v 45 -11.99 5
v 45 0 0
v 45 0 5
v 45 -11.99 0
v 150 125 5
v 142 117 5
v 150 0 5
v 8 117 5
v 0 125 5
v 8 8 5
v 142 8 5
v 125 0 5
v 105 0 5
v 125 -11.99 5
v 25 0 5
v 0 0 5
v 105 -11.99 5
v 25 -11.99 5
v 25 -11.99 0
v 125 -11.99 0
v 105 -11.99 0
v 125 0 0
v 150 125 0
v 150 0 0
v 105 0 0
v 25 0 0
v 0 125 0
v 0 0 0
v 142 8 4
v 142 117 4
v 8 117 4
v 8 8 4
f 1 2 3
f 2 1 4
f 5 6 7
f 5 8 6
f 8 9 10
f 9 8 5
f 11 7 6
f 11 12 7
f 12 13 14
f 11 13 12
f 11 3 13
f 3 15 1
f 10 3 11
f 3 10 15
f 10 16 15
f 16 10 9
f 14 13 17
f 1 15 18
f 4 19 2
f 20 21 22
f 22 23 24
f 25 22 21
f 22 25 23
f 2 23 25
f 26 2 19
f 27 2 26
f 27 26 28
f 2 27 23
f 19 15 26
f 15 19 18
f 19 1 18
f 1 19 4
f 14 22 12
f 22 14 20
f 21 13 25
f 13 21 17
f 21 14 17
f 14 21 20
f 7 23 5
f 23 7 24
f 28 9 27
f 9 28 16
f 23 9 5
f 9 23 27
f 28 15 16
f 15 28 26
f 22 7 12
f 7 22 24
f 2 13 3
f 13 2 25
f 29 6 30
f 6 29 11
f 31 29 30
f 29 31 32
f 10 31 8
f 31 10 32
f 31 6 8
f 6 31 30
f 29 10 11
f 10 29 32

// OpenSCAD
// file: ../lib/dovetail.scad
// lib/dovetail.scad
// Shared joinery modules: dovetail tenon/mortise, M3 insert boss, rounded box.
// Depends on values in params.scad (include it in the calling file).

// A dovetail tenon: a flared prism that grows wider toward its tip so it locks
// against a matching mortise when slid in along +y.
//   len   : protrusion length (along +y)
//   base_w: width at the root (x, near the part)
//   tip_w : width at the tip (x, wider -> self locking)
//   h     : height (z)
// Literal defaults keep this library self-contained under `use <>` (which does
// not import the caller's params). Callers pass explicit sizes where needed.
module dovetail_tenon(len = 8, base_w = 8, tip_w = 12, h = 10) {
    linear_extrude(height = h)
        polygon(points = [
            [-base_w/2, 0],
            [ base_w/2, 0],
            [ tip_w/2,  len],
            [-tip_w/2,  len],
        ]);
}

// Matching mortise volume (subtract this). Enlarged by tol_dovetail per side.
module dovetail_mortise(len = 8, base_w = 8, tip_w = 12, h = 10, clr = 0.15) {
    // extend slightly beyond both faces so the cut is clean
    translate([0, -0.01, -0.01])
        linear_extrude(height = h + 0.02)
            polygon(points = [
                [-(base_w/2 + clr), 0],
                [ (base_w/2 + clr), 0],
                [ (tip_w/2 + clr),  len + 0.02],
                [-(tip_w/2 + clr),  len + 0.02],
            ]);
}

// Cylindrical boss with a blind hole for a heat-set insert.
//   boss_d : outer diameter of the boss
//   boss_h : height
//   hole_d : insert press-hole diameter (params: m3_insert)
//   hole_depth : blind hole depth (0 = through)
module insert_boss(boss_d = 8, boss_h = 8, hole_d = 4.0, hole_depth = 0) {
    difference() {
        cylinder(d = boss_d, h = boss_h);
        translate([0, 0, hole_depth == 0 ? -0.01 : boss_h - hole_depth])
            cylinder(d = hole_d, h = hole_depth == 0 ? boss_h + 0.02 : hole_depth + 0.01);
    }
}

// Rounded rectangular box shell (open top) used by gondola / recesses.
module rounded_box(x, y, z, r = 2) {
    hull() {
        for (sx = [-1, 1], sy = [-1, 1])
            translate([sx * (x/2 - r), sy * (y/2 - r), 0])
                cylinder(r = r, h = z);
    }
}

// A simple rectangular slot cutter (for tabs), centered on x, open along z.
module slot(w, t, d) {
    translate([-w/2, -t/2, -0.01])
        cube([w, t, d + 0.02]);
}
// main file
// booth/wall_panel.scad
// Wall panel 150 x 125 x 5, shared base + three variants.
//   variant = "blackboard" : framed shallow recess (green paper backing)
//   variant = "window"     : 2x2 window openings + back rebate for sky paper
//   variant = "board"      : cork-style frame + pin-hole grid (bulletin board)
// Select at CLI:  openscad -D 'variant="window"' -o wall-window.stl wall_panel.scad
// Panel lies in X-Y (x=150 wide, y=125 tall, z=5 thick); two stand tabs at the
// bottom edge drop into the stand slots.

include <../params.scad>;
use <../lib/dovetail.scad>;

variant = "blackboard";       // overridden from the Makefile

fx = wall_frame;              // frame width
ix0 = fx; ix1 = wall_x - fx;  // interior x range
iy0 = fx; iy1 = wall_y - fx;  // interior y range

module base_panel() {
    // panel body
    translate([0, 0, 0]) cube([wall_x, wall_y, wall_t]);
    // two stand tabs on the bottom edge (protrude -y)
    for (sx = [-1, 1])
        translate([wall_x/2 + sx * 40 - wall_tab_w/2, -wall_tab_h + 0.01, 0])
            cube([wall_tab_w, wall_tab_h, wall_t]);
}

module blackboard() {
    difference() {
        base_panel();
        // shallow recess on the front for a green paper insert
        translate([ix0, iy0, wall_t - bb_recess_d])
            cube([ix1 - ix0, iy1 - iy0, bb_recess_d + 0.1]);
    }
}

module window() {
    difference() {
        base_panel();
        // 2x2 through openings separated by a cross mullion
        cx = (ix0 + ix1) / 2;
        cy = (iy0 + iy1) / 2;
        for (px = [[ix0, cx - win_mullion/2], [cx + win_mullion/2, ix1]])
            for (py = [[iy0, cy - win_mullion/2], [cy + win_mullion/2, iy1]])
                translate([px[0], py[0], -1])
                    cube([px[1] - px[0], py[1] - py[0], wall_t + 2]);
        // back rebate for the sky-image paper
        translate([ix0 - 2, iy0 - 2, -0.01])
            cube([ix1 - ix0 + 4, iy1 - iy0 + 4, win_inset]);
    }
}

module board() {
    difference() {
        union() {
            base_panel();
            // raised cork frame
            difference() {
                translate([ix0 - cork_frame, iy0 - cork_frame, wall_t])
                    cube([ix1 - ix0 + 2 * cork_frame, iy1 - iy0 + 2 * cork_frame, 1.5]);
                translate([ix0, iy0, wall_t - 0.01])
                    cube([ix1 - ix0, iy1 - iy0, 2]);
            }
        }
        // pin-hole grid (blind holes)
        for (i = [0 : pin_grid - 1])
            for (j = [0 : pin_grid - 1])
                translate([ix0 + (i + 0.5) * (ix1 - ix0) / pin_grid,
                           iy0 + (j + 0.5) * (iy1 - iy0) / pin_grid,
                           wall_t - pin_hole_depth])
                    cylinder(d = pin_hole_d, h = pin_hole_depth + 0.1);
    }
}

module screen() {
    // 7/23 LT-meetup: whiteboard / projector screen. The printed slide (paper)
    // drops in from the TOP edge behind the front frame, so slides can be
    // swapped during the event. Paper cut size: ~140 x 118 (see channel).
    difference() {
        union() {
            base_panel();
            // whiteboard marker-tray lip along the front bottom edge
            translate([ix0, 2, wall_t])
                cube([ix1 - ix0, scr_tray_d, scr_tray_h]);
        }
        // window opening through the front frame layer
        translate([ix0, iy0, wall_t - scr_front_t])
            cube([ix1 - ix0, iy1 - iy0, scr_front_t + 0.1]);
        // paper channel: wider than the window, open through the top edge
        translate([ix0 - scr_slot_margin, iy0 - scr_slot_margin,
                   wall_t - scr_front_t - scr_slot_t])
            cube([ix1 - ix0 + 2 * scr_slot_margin,
                  wall_y - iy0 + scr_slot_margin + 1,
                  scr_slot_t]);
    }
}

if (variant == "window")          window();
else if (variant == "board")      board();
else if (variant == "screen")     screen();
else                              blackboard();
